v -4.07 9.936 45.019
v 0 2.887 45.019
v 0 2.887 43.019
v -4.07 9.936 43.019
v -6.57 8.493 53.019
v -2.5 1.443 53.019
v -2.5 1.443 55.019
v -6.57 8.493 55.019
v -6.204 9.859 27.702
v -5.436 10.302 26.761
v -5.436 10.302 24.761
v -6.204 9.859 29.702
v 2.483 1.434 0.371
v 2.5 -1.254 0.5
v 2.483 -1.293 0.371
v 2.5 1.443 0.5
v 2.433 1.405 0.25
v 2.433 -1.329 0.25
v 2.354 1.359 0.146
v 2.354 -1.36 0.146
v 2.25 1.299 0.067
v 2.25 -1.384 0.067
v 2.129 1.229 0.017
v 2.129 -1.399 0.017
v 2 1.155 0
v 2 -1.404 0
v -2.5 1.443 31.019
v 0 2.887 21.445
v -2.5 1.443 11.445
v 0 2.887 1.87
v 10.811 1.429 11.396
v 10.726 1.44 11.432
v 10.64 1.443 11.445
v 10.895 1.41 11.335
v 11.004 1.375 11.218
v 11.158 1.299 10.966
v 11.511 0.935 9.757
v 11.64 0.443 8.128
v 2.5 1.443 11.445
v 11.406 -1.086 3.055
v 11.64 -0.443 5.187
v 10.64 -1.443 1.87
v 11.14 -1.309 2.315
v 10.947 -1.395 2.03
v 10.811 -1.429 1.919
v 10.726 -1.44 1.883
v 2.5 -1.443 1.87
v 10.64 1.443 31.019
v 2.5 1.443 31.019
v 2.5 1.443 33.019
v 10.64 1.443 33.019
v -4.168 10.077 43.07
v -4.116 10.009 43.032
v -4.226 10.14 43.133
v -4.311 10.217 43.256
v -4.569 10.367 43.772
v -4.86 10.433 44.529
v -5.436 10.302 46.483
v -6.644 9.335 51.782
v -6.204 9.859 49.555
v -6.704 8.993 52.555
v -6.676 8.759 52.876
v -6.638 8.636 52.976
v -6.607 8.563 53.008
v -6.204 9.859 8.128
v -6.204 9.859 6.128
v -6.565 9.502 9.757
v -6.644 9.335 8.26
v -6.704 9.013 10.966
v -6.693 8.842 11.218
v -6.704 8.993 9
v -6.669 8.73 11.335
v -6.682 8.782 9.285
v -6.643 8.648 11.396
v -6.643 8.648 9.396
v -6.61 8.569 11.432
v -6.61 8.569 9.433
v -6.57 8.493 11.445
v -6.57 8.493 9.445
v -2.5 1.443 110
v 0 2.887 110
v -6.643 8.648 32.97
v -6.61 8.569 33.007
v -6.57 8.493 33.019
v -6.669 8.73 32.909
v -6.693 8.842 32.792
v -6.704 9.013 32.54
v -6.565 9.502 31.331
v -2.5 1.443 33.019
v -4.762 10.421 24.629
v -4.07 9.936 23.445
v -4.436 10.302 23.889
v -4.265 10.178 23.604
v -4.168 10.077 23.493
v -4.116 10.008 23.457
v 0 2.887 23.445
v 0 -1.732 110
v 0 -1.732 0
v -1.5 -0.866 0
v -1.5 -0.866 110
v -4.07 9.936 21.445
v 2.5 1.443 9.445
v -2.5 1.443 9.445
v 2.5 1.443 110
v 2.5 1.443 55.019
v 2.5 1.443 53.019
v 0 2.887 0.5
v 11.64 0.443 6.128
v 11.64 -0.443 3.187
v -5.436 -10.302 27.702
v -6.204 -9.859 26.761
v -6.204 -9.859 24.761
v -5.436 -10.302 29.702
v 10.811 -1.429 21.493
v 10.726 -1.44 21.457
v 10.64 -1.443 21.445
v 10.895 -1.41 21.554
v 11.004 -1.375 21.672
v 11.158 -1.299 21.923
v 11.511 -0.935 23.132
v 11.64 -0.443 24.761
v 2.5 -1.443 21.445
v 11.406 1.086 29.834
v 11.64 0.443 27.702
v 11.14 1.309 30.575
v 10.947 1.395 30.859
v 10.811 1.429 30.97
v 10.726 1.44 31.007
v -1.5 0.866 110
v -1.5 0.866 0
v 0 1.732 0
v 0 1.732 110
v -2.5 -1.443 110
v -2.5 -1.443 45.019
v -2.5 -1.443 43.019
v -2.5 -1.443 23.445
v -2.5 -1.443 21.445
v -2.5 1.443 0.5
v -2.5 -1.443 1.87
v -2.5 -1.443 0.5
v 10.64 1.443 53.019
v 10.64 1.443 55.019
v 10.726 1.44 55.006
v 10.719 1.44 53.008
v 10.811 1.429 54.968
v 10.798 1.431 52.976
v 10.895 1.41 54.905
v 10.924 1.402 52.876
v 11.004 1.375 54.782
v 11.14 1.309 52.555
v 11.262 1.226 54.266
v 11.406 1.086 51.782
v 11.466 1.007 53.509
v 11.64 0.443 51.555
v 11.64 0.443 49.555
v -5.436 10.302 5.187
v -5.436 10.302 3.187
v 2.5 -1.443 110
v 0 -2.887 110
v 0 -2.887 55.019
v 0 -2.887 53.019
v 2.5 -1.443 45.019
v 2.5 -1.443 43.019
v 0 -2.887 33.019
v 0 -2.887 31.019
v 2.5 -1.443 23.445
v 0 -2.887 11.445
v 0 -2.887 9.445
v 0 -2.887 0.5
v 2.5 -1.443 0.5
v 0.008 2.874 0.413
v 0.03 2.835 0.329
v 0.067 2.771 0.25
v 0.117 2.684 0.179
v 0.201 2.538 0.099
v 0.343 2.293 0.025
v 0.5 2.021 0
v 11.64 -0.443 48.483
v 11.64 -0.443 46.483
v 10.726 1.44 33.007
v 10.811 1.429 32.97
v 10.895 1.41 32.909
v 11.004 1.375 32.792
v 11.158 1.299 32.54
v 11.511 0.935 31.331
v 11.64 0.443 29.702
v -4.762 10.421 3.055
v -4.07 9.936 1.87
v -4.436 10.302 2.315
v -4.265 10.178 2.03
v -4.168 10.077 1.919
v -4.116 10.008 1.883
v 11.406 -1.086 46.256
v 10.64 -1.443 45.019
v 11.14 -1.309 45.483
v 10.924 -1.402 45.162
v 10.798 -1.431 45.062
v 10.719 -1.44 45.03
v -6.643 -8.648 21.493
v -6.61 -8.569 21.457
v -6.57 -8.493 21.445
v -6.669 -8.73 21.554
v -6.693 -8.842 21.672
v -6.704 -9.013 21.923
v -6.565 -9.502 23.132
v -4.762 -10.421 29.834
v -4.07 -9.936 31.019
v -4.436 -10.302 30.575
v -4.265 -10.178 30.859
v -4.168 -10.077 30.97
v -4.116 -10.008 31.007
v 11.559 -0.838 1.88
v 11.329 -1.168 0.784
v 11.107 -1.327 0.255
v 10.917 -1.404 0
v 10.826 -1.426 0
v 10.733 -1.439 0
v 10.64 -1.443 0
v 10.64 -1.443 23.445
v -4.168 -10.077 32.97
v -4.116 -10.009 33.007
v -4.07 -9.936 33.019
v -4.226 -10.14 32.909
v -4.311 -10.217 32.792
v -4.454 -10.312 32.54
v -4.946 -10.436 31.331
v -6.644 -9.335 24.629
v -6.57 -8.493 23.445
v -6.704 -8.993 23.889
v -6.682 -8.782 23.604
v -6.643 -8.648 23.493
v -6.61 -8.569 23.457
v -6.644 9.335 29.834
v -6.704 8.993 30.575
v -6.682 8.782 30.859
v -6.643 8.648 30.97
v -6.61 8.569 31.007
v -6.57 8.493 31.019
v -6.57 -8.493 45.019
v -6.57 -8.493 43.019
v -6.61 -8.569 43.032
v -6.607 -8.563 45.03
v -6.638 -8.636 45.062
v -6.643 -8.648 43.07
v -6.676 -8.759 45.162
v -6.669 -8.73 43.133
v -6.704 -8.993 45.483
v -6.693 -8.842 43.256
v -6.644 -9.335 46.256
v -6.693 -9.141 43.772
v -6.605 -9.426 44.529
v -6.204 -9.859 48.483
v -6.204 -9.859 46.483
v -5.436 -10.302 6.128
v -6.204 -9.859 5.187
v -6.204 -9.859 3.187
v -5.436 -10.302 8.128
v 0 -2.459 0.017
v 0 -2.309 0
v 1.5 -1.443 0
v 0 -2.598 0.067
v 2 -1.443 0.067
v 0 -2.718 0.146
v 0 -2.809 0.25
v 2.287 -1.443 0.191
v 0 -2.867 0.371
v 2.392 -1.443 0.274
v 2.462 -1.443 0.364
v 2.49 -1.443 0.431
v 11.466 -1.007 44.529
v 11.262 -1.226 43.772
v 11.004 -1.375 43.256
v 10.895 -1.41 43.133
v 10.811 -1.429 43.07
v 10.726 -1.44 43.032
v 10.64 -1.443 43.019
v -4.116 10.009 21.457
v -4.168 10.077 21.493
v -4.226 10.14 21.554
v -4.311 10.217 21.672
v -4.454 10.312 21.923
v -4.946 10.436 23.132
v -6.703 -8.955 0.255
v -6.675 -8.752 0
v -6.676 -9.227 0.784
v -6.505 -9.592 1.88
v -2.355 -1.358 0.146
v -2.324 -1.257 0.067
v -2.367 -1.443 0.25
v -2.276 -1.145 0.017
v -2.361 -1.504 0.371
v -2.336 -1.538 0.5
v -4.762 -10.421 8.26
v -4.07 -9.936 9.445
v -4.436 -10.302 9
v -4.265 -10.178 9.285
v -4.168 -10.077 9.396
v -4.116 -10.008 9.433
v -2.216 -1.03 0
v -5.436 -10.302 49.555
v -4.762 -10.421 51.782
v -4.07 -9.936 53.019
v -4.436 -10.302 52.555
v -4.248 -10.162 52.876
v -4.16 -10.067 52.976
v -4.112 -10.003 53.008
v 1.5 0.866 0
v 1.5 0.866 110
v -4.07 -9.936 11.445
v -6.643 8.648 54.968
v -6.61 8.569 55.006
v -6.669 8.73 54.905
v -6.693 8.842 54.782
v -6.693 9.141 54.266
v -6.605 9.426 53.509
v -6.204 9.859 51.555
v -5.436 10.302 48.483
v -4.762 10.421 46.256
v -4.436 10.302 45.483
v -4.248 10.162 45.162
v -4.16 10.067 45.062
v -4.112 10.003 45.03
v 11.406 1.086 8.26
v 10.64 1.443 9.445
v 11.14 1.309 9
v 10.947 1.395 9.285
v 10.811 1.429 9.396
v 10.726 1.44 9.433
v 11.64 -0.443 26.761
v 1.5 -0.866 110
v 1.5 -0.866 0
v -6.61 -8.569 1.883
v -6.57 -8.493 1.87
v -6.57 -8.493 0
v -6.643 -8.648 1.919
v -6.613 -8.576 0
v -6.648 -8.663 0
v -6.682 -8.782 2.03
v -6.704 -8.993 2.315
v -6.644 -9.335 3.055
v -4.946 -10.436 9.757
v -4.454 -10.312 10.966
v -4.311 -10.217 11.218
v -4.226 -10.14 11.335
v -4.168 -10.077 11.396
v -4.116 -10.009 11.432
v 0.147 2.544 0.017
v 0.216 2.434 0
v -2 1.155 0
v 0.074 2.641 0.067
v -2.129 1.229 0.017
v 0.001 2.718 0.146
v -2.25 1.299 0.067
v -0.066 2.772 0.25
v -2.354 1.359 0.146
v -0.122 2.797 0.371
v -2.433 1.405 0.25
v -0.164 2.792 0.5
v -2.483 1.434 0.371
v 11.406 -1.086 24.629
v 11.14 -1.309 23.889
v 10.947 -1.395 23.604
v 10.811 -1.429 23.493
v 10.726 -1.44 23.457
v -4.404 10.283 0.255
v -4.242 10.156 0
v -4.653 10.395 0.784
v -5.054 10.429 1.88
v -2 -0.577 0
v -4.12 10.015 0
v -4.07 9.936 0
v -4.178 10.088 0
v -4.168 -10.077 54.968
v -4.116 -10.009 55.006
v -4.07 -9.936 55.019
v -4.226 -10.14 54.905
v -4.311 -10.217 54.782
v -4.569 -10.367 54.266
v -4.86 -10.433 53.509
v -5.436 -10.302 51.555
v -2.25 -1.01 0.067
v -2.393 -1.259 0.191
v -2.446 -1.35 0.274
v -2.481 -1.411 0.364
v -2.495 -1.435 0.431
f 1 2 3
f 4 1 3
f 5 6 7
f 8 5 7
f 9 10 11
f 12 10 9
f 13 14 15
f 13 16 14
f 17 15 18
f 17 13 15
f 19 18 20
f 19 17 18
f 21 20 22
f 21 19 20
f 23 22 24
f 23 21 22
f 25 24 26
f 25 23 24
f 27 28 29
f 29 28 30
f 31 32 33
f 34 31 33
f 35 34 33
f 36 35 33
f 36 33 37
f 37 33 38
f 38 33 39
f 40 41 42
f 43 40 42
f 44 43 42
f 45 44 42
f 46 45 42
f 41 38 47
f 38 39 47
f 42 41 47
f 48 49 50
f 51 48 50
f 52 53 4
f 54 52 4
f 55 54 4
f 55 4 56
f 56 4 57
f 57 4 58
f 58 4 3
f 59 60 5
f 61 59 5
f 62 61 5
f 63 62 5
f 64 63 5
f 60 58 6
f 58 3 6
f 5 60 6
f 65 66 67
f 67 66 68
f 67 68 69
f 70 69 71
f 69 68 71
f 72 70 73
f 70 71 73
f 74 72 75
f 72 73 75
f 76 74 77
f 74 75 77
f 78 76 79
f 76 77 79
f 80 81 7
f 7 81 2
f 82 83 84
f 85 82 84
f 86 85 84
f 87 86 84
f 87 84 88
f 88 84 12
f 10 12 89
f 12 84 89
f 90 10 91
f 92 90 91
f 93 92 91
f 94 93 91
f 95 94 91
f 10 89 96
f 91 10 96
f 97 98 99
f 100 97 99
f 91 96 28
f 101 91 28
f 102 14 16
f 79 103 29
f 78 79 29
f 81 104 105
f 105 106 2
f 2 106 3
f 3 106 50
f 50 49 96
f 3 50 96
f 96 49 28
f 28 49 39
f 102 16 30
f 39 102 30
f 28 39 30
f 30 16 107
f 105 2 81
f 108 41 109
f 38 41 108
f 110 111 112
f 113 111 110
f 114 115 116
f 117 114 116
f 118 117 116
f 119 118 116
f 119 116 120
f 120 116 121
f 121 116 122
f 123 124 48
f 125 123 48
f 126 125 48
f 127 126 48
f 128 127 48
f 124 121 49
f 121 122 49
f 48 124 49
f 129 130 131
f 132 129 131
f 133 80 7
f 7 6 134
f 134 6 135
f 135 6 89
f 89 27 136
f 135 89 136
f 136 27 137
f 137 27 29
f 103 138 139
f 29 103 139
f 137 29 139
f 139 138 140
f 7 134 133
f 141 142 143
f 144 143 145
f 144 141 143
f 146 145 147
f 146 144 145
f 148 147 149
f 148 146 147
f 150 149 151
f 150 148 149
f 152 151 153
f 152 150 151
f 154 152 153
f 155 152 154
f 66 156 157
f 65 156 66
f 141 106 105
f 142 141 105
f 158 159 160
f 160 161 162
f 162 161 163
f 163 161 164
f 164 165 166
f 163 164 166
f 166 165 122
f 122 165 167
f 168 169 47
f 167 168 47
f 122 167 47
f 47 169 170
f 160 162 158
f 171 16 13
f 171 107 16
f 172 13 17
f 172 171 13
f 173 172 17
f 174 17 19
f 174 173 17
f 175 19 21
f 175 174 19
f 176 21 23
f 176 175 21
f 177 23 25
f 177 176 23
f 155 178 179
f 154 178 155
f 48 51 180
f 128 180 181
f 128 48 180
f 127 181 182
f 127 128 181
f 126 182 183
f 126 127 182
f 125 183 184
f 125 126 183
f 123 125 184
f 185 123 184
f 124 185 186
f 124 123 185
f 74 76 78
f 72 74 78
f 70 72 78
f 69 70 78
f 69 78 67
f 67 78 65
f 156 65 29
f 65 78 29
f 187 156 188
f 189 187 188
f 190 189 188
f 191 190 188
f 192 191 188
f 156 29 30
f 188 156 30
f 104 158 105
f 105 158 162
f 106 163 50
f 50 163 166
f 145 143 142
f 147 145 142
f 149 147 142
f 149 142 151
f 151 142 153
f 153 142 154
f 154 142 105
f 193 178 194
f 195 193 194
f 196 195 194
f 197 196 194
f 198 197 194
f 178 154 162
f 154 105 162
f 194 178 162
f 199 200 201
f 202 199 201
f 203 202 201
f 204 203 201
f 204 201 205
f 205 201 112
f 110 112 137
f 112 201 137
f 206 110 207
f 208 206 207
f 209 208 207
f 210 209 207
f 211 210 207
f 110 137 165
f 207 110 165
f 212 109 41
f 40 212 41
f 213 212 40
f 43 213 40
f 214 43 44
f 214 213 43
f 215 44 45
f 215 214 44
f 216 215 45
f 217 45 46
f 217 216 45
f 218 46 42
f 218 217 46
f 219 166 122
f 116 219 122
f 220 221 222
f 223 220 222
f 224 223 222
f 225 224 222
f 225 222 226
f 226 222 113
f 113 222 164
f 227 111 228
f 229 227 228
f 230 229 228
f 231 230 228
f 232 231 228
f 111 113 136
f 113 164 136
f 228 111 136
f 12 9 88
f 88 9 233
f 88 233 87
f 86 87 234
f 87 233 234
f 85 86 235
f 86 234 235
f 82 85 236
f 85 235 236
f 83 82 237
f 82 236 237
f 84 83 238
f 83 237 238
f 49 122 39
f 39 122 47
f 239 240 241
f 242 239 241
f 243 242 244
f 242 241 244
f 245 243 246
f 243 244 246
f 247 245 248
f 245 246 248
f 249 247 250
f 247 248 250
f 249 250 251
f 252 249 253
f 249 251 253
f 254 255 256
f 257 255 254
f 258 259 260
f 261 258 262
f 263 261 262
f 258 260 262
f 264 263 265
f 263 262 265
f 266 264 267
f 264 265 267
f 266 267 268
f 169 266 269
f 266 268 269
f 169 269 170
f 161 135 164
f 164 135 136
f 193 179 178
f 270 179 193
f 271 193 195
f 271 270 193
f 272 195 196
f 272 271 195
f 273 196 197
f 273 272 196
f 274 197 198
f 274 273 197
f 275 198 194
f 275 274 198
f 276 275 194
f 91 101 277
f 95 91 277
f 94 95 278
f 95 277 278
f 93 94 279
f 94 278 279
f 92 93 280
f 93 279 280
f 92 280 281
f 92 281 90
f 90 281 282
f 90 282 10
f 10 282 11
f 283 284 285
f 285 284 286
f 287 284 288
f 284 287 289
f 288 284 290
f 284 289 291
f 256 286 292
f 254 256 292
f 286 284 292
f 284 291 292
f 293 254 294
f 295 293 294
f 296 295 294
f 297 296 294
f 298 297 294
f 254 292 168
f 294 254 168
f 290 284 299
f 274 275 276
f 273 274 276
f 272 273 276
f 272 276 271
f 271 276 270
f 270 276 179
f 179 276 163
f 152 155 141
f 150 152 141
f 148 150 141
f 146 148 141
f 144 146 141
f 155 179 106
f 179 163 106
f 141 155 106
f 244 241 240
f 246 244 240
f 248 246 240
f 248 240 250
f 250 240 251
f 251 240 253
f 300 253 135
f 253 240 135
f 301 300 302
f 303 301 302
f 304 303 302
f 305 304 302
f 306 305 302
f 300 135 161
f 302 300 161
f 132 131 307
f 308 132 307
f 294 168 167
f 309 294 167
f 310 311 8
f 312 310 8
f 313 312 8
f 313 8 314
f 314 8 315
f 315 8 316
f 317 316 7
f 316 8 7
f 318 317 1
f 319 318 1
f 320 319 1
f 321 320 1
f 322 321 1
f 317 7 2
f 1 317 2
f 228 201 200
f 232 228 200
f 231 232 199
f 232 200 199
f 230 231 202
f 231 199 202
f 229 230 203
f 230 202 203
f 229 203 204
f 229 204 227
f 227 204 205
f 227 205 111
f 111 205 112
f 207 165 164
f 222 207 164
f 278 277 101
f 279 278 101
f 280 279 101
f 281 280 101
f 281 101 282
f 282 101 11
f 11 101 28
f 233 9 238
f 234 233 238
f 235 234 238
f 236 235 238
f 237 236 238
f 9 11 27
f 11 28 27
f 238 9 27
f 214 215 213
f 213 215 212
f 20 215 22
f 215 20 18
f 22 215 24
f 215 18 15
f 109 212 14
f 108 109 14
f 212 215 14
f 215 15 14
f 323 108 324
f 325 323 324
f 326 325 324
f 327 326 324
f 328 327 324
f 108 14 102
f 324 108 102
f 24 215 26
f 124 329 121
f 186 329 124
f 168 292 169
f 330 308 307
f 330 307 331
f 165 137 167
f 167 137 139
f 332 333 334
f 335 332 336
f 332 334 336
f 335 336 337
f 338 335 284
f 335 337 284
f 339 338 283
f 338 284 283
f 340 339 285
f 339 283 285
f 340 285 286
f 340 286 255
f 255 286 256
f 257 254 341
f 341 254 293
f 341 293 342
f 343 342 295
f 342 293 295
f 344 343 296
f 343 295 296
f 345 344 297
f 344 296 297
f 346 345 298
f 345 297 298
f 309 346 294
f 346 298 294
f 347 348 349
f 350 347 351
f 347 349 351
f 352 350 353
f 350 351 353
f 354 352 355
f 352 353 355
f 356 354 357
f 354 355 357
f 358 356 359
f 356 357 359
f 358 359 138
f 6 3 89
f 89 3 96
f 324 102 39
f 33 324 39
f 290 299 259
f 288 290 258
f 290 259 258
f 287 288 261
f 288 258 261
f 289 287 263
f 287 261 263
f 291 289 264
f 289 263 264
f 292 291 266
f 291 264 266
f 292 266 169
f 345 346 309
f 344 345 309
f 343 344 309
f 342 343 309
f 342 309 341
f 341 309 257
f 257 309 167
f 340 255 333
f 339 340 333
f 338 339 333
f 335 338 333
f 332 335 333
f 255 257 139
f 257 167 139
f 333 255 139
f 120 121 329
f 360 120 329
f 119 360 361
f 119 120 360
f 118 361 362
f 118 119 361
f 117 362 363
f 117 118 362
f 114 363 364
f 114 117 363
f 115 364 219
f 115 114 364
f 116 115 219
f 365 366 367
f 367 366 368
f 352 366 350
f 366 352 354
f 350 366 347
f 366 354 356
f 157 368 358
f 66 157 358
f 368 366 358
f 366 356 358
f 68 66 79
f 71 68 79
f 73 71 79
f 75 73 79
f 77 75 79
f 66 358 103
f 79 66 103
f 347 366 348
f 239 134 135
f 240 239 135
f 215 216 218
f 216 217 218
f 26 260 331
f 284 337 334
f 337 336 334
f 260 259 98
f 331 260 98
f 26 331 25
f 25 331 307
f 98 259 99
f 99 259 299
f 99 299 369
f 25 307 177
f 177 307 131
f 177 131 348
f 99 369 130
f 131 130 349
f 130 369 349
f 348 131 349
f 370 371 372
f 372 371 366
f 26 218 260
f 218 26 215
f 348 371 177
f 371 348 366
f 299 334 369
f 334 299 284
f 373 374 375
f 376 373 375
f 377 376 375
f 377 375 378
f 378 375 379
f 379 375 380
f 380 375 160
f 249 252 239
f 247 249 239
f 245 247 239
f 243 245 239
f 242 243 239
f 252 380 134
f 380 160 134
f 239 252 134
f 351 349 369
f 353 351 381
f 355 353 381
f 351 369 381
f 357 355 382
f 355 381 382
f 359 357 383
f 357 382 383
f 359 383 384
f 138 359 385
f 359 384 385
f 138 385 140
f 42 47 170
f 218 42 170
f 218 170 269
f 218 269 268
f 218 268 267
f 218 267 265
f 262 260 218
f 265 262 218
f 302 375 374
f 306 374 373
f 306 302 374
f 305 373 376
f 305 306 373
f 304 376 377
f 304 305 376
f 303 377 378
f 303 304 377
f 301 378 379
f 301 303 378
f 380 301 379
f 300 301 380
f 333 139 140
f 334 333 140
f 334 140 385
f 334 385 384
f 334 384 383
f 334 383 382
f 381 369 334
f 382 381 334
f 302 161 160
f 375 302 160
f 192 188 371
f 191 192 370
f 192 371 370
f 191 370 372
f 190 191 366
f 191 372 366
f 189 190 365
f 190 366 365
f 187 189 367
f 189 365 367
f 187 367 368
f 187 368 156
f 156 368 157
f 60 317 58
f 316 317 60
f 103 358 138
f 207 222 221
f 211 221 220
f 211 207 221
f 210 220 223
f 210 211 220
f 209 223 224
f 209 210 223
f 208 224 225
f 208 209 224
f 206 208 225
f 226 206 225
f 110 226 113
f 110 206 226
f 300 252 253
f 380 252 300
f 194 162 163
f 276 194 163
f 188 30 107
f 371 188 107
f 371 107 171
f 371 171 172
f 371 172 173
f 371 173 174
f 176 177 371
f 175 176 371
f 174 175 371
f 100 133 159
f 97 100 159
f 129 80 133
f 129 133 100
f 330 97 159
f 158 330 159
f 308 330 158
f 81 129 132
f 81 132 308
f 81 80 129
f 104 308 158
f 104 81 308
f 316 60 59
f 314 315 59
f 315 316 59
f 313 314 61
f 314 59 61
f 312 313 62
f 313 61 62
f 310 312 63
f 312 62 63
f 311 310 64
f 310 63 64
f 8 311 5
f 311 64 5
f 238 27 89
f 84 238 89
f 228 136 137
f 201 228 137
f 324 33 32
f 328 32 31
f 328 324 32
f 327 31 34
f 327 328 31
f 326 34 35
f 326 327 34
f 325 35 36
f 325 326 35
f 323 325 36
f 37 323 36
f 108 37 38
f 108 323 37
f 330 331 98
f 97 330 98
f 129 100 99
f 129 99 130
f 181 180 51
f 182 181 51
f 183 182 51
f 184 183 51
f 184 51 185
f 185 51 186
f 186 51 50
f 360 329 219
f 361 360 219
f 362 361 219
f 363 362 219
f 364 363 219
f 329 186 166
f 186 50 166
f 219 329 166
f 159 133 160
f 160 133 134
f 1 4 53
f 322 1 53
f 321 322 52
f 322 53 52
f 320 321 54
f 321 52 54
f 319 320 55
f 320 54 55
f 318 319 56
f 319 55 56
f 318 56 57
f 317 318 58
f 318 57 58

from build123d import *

# Parameters (mm, degrees)
F1_DEPTH     = 110
F3_DEPTH     = 9.14
F5_DEPTH     = 9.14
F7_DEPTH     = 9.14
F8_T1_DEPTH  = 8.75
F8_T3_DEPTH  = 8.75
F8_T5_DEPTH  = 8.75
F8_T7_DEPTH  = 8.75
F8_T9_DEPTH  = 8.75
F8_T11_DEPTH = 8.6204005009
F9_R         = 0.5


# Not quite as in the source:
# - a fillet or chamfer that OpenCascade refuses, or shapes differently, is made with other operations: its cross-section is extruded or revolved along the edge and cut away or added


with BuildPart() as f1:
    # F0 (on Top) → F1 (new body)
    with BuildSketch(Plane.XY):
        Polygon((2.5, 1.443375673), (0, 2.8867513459), (-2.5, 1.443375673), (-2.5, -1.443375673), (0, -2.8867513459), (2.5, -1.443375673), align=None)
        Polygon((-1.5, 0.8660254038), (0, 1.7320508076), (1.5, 0.8660254038), (1.5, -0.8660254038), (0, -1.7320508076), (-1.5, -0.8660254038), align=None, mode=Mode.SUBTRACT)
    extrude(amount=F1_DEPTH)

    # F2 (on face) → F3 (join)
    with BuildSketch(Plane(origin=(-1.25, -2.1650635095, 0), x_dir=(0.8660254038, -0.5, 0), z_dir=(-0.5, -0.8660254038, 0))):
        Polygon((-1.443375673, 43.018942656), (1.443375673, 53.018942656), (1.443375673, 55.018942656), (-1.443375673, 45.018942656), align=None)
        Polygon((1.443375673, 31.018942656), (1.443375673, 33.018942656), (-1.443375673, 23.4446715784), (-1.443375673, 21.4446715784), align=None)
        Polygon((1.443375673, 9.4446715784), (1.443375673, 11.4446715784), (-1.443375673, 1.8704005009), (-1.443375673, 0), (-1.4042999537, 0), align=None)
    extrude(amount=F3_DEPTH)

    # F4 (on face) → F5 (join)
    with BuildSketch(Plane(origin=(-1.25, 2.1650635095, 0), x_dir=(-0.8660254038, -0.5, 0), z_dir=(-0.5, 0.8660254038, 0))):
        Polygon((-1.443375673, 43.018942656), (1.443375673, 53.018942656), (1.443375673, 55.018942656), (-1.443375673, 45.018942656), align=None)
        Polygon((1.443375673, 31.018942656), (1.443375673, 33.018942656), (-1.443375673, 23.4446715784), (-1.443375673, 21.4446715784), align=None)
        Polygon((1.443375673, 9.4446715784), (1.443375673, 11.4446715784), (-1.443375673, 1.8704005009), (-1.443375673, 0), (-1.4042999537, 0), align=None)
    extrude(amount=F5_DEPTH)

    # F6 (on face) → F7 (join)
    with BuildSketch(Plane.YZ.offset(2.5)):
        Polygon((-1.443375673, 43.018942656), (1.443375673, 53.018942656), (1.443375673, 55.018942656), (-1.443375673, 45.018942656), align=None)
        Polygon((1.443375673, 31.018942656), (1.443375673, 33.018942656), (-1.443375673, 23.4446715784), (-1.443375673, 21.4446715784), align=None)
        Polygon((1.443375673, 9.4446715784), (1.443375673, 11.4446715784), (-1.443375673, 1.8704005009), (-1.443375673, 0), (-1.4042999537, 0), align=None)
    extrude(amount=F7_DEPTH)

    # F8: fillet of radius 1 on 18 edges, made by hand

    # F8_s2 → F8_t1 (cut)
    with BuildSketch(Plane.XY.offset(40.518942656)):
        with BuildLine():
            ThreePointArc((-6.57, -8.4928224598), (-6.6699004225, -9.2516415049), (-6.2039745962, -9.8588478636))
            Line((-6.2039745962, -9.8588478636), (-7.07, -9.3588478636))
            Line((-7.07, -9.3588478636), (-6.57, -8.4928224598))
        make_face()
        with BuildLine():
            ThreePointArc((11.64, -0.443375673), (11.3471067812, -1.1504824542), (10.64, -1.443375673))
            Line((10.64, -1.443375673), (11.64, -1.443375673))
            Line((11.64, -1.443375673), (11.64, -0.443375673))
        make_face()
        with BuildLine():
            ThreePointArc((-4.07, 9.9361981328), (-4.6772063587, 10.402123959), (-5.4360254038, 10.3022235365))
            Line((-5.4360254038, 10.3022235365), (-4.57, 10.8022235365))
            Line((-4.57, 10.8022235365), (-4.07, 9.9361981328))
        make_face()
    extrude(amount=F8_T1_DEPTH, mode=Mode.SUBTRACT)

    # F8_s4 → F8_t3 (cut)
    with BuildSketch(Plane.XY.offset(48.768942656)):
        with BuildLine():
            ThreePointArc((-4.07, -9.9361981328), (-4.6772063587, -10.402123959), (-5.4360254038, -10.3022235365))
            Line((-5.4360254038, -10.3022235365), (-4.57, -10.8022235365))
            Line((-4.57, -10.8022235365), (-4.07, -9.9361981328))
        make_face()
        with BuildLine():
            ThreePointArc((10.64, 1.443375673), (11.3471067812, 1.1504824542), (11.64, 0.443375673))
            Line((11.64, 0.443375673), (11.64, 1.443375673))
            Line((11.64, 1.443375673), (10.64, 1.443375673))
        make_face()
        with BuildLine():
            ThreePointArc((-6.2039745962, 9.8588478636), (-6.6699004225, 9.2516415049), (-6.57, 8.4928224598))
            Line((-6.57, 8.4928224598), (-7.07, 9.3588478636))
            Line((-7.07, 9.3588478636), (-6.2039745962, 9.8588478636))
        make_face()
    extrude(amount=F8_T3_DEPTH, mode=Mode.SUBTRACT)

    # F8_s6 → F8_t5 (cut)
    with BuildSketch(Plane.XY.offset(26.768942656)):
        with BuildLine():
            ThreePointArc((-4.07, -9.9361981328), (-4.6772063587, -10.402123959), (-5.4360254038, -10.3022235365))
            Line((-5.4360254038, -10.3022235365), (-4.57, -10.8022235365))
            Line((-4.57, -10.8022235365), (-4.07, -9.9361981328))
        make_face()
        with BuildLine():
            ThreePointArc((10.64, 1.443375673), (11.3471067812, 1.1504824542), (11.64, 0.443375673))
            Line((11.64, 0.443375673), (11.64, 1.443375673))
            Line((11.64, 1.443375673), (10.64, 1.443375673))
        make_face()
        with BuildLine():
            ThreePointArc((-6.2039745962, 9.8588478636), (-6.6699004225, 9.2516415049), (-6.57, 8.4928224598))
            Line((-6.57, 8.4928224598), (-7.07, 9.3588478636))
            Line((-7.07, 9.3588478636), (-6.2039745962, 9.8588478636))
        make_face()
    extrude(amount=F8_T5_DEPTH, mode=Mode.SUBTRACT)

    # F8_s8 → F8_t7 (cut)
    with BuildSketch(Plane.XY.offset(18.9446715784)):
        with BuildLine():
            ThreePointArc((-6.57, -8.4928224598), (-6.6699004225, -9.2516415049), (-6.2039745962, -9.8588478636))
            Line((-6.2039745962, -9.8588478636), (-7.07, -9.3588478636))
            Line((-7.07, -9.3588478636), (-6.57, -8.4928224598))
        make_face()
        with BuildLine():
            ThreePointArc((11.64, -0.443375673), (11.3471067812, -1.1504824542), (10.64, -1.443375673))
            Line((10.64, -1.443375673), (11.64, -1.443375673))
            Line((11.64, -1.443375673), (11.64, -0.443375673))
        make_face()
        with BuildLine():
            ThreePointArc((-4.07, 9.9361981328), (-4.6772063587, 10.402123959), (-5.4360254038, 10.3022235365))
            Line((-5.4360254038, 10.3022235365), (-4.57, 10.8022235365))
            Line((-4.57, 10.8022235365), (-4.07, 9.9361981328))
        make_face()
    extrude(amount=F8_T7_DEPTH, mode=Mode.SUBTRACT)

    # F8_s10 → F8_t9 (cut)
    with BuildSketch(Plane.XY.offset(5.1946715784)):
        with BuildLine():
            ThreePointArc((-5.4360254038, -10.3022235365), (-4.6772063587, -10.402123959), (-4.07, -9.9361981328))
            Line((-4.07, -9.9361981328), (-4.57, -10.8022235365))
            Line((-4.57, -10.8022235365), (-5.4360254038, -10.3022235365))
        make_face()
        with BuildLine():
            ThreePointArc((10.64, 1.443375673), (11.3471067812, 1.1504824542), (11.64, 0.443375673))
            Line((11.64, 0.443375673), (11.64, 1.443375673))
            Line((11.64, 1.443375673), (10.64, 1.443375673))
        make_face()
        with BuildLine():
            ThreePointArc((-6.2039745962, 9.8588478636), (-6.6699004225, 9.2516415049), (-6.57, 8.4928224598))
            Line((-6.57, 8.4928224598), (-7.07, 9.3588478636))
            Line((-7.07, 9.3588478636), (-6.2039745962, 9.8588478636))
        make_face()
    extrude(amount=F8_T9_DEPTH, mode=Mode.SUBTRACT)

    # F8_s12 → F8_t11 (cut)
    with BuildSketch(Plane.XY.offset(-2.5)):
        with BuildLine():
            ThreePointArc((-6.57, -8.4928224598), (-6.6699004225, -9.2516415049), (-6.2039745962, -9.8588478636))
            Line((-6.2039745962, -9.8588478636), (-7.07, -9.3588478636))
            Line((-7.07, -9.3588478636), (-6.57, -8.4928224598))
        make_face()
        with BuildLine():
            ThreePointArc((11.64, -0.443375673), (11.3471067812, -1.1504824542), (10.64, -1.443375673))
            Line((10.64, -1.443375673), (11.64, -1.443375673))
            Line((11.64, -1.443375673), (11.64, -0.443375673))
        make_face()
        with BuildLine():
            ThreePointArc((-4.07, 9.9361981328), (-4.6772063587, 10.402123959), (-5.4360254038, 10.3022235365))
            Line((-5.4360254038, 10.3022235365), (-4.57, 10.8022235365))
            Line((-4.57, 10.8022235365), (-4.07, 9.9361981328))
        make_face()
    extrude(amount=F8_T11_DEPTH, mode=Mode.SUBTRACT)

    # F9
    f9_edges = [f1.edges().sort_by_distance(p)[0] for p in [
        (1.25, -2.165064, 0),
        (-1.23308, -2.174832, 0),
        (-2.5, 0, 0),
        (-1.26692, 2.155295, 0),
        (1.25, 2.165064, 0),
        (2.5, 0.019538, 0),
    ]]
    fillet(f9_edges, radius=F9_R)


solid = f1.part
